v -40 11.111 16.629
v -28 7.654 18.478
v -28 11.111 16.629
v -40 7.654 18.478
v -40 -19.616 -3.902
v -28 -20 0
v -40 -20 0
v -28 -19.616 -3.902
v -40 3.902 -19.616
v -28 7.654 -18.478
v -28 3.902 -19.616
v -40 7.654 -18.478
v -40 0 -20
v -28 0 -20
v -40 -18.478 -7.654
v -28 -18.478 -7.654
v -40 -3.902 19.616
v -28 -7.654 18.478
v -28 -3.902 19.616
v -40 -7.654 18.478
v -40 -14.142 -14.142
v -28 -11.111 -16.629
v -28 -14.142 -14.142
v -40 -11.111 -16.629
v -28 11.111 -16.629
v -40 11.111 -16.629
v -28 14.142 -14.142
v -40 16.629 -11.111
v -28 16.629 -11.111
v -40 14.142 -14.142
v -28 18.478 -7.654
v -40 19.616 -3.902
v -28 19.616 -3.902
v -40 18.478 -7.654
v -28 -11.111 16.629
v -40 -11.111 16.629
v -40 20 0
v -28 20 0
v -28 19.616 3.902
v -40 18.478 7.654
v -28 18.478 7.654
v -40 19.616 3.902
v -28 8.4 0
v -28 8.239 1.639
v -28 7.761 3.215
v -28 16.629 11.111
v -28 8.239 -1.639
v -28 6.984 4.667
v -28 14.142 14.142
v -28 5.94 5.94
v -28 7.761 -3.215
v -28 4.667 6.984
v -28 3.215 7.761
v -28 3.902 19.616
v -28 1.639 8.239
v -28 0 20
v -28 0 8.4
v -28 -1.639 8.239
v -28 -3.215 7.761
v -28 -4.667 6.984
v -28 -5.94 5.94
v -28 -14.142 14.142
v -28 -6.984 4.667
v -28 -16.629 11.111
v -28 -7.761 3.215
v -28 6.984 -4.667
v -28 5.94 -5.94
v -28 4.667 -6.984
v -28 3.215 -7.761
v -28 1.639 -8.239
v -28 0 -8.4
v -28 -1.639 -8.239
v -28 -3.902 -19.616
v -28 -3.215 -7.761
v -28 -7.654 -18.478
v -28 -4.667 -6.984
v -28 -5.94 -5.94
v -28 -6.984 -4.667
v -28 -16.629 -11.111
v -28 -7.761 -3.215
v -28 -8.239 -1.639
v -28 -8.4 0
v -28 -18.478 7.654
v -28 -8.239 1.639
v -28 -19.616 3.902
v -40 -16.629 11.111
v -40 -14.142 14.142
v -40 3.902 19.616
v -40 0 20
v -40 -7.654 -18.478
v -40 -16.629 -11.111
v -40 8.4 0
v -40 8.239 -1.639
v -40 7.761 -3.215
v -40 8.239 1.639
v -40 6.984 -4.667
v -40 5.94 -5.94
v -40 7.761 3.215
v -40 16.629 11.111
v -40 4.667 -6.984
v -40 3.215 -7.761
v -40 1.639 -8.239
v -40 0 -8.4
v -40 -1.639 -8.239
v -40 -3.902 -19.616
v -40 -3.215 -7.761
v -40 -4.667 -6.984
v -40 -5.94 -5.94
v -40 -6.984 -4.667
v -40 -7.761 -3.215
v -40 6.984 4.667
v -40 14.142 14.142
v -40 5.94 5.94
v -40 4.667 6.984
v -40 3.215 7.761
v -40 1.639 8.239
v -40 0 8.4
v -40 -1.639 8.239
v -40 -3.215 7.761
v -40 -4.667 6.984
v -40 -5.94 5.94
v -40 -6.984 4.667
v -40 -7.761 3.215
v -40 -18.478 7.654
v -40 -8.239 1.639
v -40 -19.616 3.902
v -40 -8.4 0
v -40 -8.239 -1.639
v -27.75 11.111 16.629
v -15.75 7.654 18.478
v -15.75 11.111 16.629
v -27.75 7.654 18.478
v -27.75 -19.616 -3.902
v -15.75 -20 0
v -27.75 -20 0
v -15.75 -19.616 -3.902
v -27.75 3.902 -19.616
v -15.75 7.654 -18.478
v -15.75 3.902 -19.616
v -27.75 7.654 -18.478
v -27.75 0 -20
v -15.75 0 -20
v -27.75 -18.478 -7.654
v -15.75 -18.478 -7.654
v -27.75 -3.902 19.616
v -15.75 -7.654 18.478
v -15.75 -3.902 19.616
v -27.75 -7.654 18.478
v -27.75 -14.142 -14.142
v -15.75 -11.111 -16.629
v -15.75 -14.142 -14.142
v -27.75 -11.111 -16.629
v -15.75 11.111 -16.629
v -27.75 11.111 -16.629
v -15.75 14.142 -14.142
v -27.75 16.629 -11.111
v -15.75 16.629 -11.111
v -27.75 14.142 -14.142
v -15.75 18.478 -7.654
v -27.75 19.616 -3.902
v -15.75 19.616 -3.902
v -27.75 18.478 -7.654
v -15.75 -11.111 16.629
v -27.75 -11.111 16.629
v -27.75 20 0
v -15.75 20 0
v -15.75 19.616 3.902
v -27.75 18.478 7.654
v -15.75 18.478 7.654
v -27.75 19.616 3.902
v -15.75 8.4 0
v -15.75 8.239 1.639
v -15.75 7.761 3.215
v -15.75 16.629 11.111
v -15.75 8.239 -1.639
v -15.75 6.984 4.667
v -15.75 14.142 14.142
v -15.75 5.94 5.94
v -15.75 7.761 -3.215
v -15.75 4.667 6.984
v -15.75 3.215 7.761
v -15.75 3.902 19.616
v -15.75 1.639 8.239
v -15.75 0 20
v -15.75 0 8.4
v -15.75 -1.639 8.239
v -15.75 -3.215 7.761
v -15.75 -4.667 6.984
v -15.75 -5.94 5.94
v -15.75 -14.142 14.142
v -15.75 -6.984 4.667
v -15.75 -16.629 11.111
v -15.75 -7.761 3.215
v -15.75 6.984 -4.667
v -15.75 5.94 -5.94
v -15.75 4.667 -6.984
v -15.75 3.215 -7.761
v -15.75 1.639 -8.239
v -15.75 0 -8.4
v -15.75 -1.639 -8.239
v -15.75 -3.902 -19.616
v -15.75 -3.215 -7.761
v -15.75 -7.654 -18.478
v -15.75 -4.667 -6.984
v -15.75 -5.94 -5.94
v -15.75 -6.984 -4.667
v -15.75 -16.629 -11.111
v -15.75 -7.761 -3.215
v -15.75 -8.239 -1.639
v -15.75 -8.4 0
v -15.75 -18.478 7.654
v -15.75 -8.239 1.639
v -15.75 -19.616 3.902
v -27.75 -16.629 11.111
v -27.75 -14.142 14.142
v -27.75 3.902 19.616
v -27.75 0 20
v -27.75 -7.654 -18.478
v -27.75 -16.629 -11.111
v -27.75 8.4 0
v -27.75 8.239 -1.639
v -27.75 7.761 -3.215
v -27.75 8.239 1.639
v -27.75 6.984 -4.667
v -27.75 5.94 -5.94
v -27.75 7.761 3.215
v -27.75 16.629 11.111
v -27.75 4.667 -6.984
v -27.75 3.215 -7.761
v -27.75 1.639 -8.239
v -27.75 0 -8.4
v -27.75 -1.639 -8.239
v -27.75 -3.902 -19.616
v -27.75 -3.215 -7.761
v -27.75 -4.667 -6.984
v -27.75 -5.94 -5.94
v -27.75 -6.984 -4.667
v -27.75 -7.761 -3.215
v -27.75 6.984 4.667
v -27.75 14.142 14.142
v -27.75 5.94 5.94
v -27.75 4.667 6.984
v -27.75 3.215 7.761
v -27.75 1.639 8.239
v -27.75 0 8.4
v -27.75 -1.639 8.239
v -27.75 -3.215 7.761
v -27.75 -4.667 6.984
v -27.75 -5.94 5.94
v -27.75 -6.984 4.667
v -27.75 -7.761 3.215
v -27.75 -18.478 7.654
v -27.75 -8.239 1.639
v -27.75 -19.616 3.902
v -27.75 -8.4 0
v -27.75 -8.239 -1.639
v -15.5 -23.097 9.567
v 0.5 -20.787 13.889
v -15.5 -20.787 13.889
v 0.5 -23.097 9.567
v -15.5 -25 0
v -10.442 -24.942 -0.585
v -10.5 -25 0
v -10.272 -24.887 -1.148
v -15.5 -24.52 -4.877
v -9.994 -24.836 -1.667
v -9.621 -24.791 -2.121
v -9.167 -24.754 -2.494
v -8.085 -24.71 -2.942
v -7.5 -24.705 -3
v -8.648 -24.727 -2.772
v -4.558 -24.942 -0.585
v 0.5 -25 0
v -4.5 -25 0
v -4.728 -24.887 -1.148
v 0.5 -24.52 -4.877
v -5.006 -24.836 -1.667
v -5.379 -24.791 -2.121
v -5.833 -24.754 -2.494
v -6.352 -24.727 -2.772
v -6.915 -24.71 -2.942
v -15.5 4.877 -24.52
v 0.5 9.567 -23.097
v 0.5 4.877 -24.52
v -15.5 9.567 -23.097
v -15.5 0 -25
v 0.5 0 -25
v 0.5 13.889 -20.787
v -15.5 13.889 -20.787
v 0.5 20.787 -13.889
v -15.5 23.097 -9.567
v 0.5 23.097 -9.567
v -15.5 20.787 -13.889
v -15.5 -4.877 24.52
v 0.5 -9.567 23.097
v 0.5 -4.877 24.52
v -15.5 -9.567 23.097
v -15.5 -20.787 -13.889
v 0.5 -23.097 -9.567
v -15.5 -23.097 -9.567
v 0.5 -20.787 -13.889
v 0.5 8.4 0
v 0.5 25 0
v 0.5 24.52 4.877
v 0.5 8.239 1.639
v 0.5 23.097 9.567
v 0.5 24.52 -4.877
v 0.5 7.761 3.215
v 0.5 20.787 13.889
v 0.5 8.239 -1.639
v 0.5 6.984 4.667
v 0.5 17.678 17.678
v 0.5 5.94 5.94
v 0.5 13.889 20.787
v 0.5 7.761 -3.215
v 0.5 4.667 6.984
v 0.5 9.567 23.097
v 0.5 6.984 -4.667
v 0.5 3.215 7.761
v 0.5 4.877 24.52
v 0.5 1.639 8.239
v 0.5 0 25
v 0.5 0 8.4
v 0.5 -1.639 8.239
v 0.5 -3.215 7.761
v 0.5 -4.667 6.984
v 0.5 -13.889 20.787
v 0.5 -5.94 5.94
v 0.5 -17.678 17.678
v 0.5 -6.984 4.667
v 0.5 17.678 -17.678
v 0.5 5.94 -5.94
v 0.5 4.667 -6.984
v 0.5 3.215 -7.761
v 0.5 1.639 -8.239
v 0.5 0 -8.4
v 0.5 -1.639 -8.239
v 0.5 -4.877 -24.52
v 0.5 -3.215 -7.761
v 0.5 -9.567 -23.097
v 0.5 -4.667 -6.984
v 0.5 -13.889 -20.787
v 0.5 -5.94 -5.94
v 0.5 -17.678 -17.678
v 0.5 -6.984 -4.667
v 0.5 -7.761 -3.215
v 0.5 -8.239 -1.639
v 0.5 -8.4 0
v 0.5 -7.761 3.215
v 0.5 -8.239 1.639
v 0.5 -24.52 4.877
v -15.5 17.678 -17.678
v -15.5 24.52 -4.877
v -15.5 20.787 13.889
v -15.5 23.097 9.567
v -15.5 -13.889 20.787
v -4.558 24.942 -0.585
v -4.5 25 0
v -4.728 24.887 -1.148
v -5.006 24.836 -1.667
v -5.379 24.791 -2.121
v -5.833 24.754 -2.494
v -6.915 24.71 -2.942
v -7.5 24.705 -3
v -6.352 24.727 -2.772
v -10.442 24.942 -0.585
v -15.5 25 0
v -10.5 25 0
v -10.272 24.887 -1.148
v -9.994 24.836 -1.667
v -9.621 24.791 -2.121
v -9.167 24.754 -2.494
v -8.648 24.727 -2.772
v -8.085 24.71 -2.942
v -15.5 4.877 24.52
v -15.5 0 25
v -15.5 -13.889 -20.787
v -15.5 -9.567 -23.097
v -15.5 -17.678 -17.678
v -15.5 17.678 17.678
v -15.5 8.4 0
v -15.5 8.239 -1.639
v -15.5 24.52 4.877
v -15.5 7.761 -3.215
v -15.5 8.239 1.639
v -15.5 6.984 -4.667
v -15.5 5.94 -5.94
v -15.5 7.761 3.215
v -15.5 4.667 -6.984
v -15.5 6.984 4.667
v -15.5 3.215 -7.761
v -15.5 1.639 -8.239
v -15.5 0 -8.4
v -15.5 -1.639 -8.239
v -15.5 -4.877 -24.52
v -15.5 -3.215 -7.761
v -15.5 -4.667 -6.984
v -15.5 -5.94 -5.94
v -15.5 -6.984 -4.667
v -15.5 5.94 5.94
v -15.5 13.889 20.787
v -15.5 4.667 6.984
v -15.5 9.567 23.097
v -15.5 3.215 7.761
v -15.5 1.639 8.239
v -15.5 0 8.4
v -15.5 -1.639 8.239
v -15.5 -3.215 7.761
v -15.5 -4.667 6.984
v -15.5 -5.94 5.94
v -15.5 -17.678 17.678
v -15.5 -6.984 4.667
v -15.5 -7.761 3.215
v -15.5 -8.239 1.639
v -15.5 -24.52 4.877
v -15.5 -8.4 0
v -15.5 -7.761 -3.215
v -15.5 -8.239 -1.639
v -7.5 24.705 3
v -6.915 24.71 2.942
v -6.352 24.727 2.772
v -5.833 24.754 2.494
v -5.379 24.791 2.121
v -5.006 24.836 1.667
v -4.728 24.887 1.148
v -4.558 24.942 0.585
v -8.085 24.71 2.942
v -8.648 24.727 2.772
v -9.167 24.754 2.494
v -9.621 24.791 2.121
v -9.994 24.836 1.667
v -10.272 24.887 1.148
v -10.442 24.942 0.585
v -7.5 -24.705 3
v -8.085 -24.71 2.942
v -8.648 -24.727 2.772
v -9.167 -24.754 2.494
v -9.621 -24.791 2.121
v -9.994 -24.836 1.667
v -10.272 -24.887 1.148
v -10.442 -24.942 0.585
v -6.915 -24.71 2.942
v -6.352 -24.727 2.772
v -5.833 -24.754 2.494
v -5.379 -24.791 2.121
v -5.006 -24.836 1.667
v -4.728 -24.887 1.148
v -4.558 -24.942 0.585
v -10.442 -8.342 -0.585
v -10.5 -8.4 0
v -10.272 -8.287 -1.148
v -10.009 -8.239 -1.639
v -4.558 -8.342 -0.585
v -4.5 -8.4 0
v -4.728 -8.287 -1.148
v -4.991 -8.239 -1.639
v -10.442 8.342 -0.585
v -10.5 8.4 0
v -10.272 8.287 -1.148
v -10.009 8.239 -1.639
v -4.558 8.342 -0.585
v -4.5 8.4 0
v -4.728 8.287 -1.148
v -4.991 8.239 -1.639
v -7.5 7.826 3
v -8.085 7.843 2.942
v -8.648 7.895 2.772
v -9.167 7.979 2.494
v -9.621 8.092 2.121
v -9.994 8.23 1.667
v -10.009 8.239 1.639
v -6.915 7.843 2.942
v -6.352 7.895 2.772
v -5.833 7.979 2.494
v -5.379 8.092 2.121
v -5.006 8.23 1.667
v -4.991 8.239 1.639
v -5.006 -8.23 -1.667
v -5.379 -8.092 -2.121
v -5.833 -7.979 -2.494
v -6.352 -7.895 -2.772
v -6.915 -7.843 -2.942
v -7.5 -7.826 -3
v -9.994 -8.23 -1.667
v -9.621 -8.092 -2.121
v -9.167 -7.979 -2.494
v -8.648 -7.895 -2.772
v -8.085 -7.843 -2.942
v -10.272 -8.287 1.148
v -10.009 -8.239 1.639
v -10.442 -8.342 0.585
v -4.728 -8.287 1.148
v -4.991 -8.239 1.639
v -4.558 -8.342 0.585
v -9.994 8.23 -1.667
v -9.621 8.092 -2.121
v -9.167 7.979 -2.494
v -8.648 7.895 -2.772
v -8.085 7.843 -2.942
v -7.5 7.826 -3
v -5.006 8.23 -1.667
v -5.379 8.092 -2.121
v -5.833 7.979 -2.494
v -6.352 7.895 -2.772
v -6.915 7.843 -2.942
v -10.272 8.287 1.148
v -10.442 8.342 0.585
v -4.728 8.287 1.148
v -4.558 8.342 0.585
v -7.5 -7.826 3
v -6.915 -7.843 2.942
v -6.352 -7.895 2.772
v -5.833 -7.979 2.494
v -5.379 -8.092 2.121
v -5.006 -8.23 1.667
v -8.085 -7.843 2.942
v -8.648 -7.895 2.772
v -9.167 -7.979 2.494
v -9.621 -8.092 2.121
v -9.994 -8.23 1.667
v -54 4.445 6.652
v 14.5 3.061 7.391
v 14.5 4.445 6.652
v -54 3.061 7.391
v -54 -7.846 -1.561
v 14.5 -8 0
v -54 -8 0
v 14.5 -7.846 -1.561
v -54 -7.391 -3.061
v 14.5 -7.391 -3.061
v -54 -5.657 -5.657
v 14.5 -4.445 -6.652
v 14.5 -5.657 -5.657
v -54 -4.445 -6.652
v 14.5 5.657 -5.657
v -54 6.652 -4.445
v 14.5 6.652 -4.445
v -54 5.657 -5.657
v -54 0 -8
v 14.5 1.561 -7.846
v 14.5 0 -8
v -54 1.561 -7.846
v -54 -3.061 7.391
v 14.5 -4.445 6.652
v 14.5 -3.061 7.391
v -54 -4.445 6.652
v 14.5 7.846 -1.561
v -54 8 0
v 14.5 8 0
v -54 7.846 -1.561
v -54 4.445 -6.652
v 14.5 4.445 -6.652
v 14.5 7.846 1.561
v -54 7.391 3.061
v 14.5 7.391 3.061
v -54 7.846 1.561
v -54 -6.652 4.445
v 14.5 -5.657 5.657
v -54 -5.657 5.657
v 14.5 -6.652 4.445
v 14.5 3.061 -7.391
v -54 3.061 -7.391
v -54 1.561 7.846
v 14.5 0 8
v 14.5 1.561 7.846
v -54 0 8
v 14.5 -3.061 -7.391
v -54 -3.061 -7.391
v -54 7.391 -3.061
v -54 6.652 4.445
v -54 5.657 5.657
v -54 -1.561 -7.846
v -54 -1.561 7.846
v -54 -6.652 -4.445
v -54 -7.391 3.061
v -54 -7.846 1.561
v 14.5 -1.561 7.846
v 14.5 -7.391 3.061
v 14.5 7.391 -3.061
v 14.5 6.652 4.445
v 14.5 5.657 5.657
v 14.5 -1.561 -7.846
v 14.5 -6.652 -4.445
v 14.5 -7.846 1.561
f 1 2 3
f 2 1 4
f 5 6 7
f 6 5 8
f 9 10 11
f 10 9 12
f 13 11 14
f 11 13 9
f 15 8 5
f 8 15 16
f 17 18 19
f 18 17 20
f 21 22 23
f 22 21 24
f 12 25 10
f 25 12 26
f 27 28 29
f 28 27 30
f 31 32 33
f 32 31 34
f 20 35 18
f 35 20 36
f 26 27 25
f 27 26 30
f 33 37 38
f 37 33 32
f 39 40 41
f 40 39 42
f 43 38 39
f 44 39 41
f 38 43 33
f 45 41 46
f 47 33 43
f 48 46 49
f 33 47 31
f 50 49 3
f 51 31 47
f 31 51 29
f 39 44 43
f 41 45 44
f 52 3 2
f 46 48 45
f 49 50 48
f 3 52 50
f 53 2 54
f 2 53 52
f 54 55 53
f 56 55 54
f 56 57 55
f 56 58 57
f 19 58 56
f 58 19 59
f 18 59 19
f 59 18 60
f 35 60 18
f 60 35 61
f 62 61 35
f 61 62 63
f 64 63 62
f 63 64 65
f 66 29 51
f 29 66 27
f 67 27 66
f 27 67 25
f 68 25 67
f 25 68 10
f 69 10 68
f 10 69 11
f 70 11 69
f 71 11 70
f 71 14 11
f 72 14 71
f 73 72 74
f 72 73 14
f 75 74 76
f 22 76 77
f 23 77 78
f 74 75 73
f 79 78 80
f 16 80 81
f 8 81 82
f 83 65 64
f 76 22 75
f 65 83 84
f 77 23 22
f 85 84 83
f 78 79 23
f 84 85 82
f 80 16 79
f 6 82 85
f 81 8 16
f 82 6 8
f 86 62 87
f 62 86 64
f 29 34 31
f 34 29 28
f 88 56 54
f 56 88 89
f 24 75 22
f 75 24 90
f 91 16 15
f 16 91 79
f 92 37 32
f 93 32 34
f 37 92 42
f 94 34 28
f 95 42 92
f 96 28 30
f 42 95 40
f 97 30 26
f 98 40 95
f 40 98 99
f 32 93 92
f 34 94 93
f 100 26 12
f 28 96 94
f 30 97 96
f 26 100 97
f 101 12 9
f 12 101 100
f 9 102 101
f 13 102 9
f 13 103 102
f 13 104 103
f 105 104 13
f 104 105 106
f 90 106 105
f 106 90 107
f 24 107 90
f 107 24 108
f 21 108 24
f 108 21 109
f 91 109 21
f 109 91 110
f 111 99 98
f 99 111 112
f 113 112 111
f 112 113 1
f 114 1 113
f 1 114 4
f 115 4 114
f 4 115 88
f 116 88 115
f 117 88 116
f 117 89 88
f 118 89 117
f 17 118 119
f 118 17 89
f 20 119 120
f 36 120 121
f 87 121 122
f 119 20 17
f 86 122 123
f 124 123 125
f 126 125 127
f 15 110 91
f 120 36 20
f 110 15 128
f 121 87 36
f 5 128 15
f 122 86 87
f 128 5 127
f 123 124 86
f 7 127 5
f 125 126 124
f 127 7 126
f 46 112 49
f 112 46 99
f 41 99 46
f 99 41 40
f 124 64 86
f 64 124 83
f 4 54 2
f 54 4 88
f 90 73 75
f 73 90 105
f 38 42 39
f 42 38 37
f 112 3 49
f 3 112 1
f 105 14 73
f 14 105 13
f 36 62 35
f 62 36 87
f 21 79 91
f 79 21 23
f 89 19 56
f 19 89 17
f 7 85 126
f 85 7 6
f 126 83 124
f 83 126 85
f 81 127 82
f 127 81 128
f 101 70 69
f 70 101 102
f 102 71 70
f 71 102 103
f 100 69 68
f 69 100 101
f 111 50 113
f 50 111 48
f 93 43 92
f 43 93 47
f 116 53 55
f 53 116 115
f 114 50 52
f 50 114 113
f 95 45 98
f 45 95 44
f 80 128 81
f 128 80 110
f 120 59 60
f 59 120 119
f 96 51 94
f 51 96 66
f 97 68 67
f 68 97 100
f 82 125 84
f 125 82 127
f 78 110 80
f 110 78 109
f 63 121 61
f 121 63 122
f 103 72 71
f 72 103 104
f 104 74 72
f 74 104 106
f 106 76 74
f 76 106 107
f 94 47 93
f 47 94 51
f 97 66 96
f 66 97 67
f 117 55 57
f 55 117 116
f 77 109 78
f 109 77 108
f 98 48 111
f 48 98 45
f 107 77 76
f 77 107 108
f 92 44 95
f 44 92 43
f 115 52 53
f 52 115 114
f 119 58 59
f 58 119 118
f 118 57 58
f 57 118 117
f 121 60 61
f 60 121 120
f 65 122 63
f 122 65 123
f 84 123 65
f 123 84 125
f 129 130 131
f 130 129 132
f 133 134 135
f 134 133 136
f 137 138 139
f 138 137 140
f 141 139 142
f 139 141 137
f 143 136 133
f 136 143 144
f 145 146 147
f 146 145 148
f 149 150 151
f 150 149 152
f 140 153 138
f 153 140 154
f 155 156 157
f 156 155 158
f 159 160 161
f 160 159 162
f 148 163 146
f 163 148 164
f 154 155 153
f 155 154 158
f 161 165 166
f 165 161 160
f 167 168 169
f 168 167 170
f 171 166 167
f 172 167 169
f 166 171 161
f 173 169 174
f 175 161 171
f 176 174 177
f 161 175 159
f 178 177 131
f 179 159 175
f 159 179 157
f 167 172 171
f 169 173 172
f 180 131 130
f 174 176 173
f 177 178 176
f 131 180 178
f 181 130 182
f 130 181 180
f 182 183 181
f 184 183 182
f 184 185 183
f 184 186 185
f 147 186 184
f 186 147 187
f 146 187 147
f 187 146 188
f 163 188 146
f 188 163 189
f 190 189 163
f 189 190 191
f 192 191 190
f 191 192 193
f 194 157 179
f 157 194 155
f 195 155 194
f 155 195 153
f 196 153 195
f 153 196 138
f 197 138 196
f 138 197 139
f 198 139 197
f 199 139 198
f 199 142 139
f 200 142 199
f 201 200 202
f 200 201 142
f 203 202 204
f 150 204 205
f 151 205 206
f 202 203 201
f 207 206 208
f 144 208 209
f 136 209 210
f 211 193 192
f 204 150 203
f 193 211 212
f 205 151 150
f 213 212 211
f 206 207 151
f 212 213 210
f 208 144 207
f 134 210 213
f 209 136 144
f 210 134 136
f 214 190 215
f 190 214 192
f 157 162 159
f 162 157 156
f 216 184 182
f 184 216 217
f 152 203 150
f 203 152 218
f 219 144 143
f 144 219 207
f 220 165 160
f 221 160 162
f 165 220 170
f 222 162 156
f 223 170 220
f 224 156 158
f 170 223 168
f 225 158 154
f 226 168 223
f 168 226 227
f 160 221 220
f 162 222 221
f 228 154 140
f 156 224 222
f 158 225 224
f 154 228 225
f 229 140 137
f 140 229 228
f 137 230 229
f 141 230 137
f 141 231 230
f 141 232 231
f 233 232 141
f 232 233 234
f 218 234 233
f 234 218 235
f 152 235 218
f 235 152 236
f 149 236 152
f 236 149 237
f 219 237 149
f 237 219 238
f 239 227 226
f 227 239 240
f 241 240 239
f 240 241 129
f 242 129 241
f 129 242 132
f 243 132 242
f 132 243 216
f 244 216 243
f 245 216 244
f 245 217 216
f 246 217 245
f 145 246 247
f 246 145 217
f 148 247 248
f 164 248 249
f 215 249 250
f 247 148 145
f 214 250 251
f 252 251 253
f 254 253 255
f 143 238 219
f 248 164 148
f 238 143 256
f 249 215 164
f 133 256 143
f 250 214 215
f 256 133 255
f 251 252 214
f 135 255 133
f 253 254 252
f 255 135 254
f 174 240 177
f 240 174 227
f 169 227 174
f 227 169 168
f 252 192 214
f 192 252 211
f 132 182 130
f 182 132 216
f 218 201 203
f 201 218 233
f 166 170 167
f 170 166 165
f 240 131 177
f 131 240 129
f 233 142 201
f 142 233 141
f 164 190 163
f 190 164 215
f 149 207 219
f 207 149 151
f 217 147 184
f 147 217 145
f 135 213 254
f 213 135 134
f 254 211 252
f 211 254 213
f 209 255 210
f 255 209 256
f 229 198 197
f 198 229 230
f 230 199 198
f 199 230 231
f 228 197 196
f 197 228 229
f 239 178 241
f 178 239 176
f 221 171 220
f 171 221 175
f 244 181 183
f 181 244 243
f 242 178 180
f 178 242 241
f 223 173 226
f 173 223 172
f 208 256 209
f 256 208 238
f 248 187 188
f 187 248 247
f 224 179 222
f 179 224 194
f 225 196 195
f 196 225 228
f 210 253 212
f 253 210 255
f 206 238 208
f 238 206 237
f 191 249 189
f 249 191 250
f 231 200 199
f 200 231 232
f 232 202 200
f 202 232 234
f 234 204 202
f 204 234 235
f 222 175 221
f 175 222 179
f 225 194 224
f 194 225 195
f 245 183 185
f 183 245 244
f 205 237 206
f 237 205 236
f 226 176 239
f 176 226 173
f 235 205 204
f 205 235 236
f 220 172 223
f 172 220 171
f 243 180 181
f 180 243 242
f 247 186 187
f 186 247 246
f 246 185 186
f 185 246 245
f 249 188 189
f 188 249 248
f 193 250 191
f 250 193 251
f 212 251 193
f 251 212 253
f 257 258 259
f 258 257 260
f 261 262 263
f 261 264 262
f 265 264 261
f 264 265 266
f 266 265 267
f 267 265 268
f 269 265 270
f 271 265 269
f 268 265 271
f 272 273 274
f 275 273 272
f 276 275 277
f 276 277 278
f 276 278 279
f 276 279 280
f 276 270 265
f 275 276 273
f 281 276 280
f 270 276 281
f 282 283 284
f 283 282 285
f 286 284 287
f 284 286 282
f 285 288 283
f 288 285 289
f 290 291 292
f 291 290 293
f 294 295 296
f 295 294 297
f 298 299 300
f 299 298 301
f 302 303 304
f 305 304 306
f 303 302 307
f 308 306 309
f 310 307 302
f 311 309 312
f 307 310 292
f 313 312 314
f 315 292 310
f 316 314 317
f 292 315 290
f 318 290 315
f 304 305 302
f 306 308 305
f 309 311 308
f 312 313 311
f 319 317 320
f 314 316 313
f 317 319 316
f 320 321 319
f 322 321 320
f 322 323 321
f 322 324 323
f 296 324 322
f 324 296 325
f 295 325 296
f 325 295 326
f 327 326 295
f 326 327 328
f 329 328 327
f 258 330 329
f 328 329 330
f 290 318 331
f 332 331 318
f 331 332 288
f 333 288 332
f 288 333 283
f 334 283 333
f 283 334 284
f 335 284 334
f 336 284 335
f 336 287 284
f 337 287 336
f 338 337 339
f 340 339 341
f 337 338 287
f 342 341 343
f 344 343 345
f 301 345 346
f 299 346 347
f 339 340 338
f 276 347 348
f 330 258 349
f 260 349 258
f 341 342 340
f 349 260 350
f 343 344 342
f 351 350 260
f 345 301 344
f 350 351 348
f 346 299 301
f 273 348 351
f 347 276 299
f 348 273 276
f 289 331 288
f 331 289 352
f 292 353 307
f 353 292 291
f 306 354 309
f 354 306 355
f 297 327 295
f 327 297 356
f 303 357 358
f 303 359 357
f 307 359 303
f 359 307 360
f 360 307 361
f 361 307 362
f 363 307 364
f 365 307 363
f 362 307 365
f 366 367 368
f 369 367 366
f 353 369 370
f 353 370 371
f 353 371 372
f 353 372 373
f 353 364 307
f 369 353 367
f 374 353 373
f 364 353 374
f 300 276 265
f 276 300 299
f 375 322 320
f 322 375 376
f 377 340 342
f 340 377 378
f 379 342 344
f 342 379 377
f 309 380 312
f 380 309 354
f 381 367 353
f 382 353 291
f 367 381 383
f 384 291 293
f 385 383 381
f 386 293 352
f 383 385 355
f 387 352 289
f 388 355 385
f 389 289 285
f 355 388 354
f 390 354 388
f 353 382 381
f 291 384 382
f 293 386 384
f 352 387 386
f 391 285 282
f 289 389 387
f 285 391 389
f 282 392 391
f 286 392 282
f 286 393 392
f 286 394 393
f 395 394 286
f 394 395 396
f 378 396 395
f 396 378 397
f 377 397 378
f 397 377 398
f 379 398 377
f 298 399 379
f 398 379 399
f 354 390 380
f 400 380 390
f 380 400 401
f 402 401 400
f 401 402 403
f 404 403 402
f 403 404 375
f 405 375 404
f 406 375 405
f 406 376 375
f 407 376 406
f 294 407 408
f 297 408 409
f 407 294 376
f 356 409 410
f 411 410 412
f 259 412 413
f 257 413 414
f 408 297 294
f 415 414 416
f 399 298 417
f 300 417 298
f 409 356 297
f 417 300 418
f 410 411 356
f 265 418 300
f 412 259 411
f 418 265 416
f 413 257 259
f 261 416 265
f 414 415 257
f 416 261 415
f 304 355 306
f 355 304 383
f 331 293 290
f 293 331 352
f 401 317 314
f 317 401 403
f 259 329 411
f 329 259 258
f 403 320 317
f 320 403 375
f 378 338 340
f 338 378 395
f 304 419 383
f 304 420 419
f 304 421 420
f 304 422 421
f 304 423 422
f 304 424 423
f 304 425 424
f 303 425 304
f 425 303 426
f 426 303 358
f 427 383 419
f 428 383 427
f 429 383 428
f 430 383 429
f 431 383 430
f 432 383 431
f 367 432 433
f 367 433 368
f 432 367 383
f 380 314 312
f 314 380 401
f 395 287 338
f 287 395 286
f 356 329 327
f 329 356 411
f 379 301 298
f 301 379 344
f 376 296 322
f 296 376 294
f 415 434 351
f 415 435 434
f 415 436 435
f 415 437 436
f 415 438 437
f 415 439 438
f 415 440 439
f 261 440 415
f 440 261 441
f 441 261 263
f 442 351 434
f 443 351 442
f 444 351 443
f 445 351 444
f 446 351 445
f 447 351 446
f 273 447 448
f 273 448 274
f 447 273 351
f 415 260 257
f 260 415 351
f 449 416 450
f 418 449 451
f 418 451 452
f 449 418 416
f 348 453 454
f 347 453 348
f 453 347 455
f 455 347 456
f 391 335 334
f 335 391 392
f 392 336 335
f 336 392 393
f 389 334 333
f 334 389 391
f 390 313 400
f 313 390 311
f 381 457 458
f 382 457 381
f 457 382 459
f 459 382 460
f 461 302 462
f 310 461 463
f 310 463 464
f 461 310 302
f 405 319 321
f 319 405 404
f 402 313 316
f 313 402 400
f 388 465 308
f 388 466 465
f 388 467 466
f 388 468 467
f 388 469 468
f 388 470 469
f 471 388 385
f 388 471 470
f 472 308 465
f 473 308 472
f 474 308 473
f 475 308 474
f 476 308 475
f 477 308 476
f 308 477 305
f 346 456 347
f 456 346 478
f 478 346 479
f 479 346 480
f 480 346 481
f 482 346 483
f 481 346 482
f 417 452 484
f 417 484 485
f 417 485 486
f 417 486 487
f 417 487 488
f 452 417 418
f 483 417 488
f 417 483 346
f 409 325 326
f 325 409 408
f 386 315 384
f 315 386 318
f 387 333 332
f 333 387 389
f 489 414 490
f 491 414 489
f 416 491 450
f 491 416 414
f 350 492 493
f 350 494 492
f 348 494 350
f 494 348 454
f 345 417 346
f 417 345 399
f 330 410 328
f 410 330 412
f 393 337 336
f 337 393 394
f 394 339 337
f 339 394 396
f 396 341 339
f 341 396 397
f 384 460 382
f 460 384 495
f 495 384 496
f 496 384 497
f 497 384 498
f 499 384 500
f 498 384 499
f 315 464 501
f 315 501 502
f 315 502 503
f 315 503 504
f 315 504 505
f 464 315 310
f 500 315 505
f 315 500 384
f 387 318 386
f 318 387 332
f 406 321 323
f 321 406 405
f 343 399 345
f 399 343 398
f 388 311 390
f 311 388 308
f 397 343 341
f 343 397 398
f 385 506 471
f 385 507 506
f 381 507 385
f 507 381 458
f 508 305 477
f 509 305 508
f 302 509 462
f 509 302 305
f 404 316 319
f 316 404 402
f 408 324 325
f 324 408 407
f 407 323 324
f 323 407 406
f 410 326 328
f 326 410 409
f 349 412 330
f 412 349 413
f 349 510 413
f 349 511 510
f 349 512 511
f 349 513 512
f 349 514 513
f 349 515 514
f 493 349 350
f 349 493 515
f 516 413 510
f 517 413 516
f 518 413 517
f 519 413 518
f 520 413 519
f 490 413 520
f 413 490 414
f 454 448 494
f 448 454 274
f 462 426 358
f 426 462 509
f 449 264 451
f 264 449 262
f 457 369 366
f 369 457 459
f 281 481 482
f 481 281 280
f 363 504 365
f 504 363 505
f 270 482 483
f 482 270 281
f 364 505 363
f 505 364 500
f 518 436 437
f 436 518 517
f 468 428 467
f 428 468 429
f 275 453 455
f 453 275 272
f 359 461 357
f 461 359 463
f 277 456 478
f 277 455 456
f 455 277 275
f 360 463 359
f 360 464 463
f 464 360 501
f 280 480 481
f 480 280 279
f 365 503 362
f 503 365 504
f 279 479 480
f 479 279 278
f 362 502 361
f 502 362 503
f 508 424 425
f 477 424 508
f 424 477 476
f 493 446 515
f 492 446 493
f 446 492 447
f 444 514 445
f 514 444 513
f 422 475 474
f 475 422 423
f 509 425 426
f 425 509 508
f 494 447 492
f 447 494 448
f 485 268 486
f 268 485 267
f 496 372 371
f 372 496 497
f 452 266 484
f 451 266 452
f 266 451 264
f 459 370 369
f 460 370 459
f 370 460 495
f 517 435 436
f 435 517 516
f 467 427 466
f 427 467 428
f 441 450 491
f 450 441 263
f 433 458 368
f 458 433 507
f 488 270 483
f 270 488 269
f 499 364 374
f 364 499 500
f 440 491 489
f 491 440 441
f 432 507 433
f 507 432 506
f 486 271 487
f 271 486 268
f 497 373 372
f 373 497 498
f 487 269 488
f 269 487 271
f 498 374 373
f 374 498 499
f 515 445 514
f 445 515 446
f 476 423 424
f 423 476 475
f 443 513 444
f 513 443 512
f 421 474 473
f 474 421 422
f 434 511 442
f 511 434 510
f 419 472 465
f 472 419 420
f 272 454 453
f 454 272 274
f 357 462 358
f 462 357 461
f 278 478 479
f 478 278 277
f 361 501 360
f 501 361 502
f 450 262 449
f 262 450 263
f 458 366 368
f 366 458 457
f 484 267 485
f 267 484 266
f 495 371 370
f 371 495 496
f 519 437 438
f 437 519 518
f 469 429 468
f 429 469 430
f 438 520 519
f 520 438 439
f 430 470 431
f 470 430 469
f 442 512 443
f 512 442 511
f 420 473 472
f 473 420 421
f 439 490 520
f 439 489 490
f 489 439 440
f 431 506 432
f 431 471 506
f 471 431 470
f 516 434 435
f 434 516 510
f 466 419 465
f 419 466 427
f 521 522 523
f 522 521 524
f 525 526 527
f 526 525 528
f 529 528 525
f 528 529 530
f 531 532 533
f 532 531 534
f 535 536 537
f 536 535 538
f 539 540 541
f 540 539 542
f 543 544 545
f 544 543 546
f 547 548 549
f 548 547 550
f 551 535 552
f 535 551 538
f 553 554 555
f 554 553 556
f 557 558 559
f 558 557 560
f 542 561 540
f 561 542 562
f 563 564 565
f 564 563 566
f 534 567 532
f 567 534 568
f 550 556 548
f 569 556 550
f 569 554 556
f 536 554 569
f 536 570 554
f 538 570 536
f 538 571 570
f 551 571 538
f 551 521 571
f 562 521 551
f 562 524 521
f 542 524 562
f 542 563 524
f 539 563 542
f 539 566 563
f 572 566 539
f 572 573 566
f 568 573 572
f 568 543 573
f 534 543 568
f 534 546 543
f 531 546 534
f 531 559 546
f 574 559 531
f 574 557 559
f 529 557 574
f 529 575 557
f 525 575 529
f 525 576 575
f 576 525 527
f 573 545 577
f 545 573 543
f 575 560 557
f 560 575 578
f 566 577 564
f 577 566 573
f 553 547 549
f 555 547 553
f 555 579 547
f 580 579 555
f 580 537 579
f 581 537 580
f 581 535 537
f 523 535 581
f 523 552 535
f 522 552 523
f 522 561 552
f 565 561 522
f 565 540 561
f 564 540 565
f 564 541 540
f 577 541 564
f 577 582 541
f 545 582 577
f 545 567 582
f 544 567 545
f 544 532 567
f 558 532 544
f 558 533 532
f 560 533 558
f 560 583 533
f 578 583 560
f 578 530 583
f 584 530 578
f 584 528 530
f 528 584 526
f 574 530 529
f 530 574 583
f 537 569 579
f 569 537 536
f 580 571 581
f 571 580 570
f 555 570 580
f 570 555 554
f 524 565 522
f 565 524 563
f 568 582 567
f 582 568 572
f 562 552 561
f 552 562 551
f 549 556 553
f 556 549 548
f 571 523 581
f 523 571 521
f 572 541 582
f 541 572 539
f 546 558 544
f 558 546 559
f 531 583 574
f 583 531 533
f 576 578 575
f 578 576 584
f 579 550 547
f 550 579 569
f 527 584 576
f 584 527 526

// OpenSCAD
$fn = 32;

// ------------------------------------------------------------------------
// Shaft with rings and collars: d16 shaft, 3 rings
// Every part is its own module, assembly() places them once.
// ------------------------------------------------------------------------

// --- part 1 ---
module shaft() {
  translate([0, 0, -34.25]) cylinder(h = 68.5, d = 16);
}

// --- part 2 ---
module spacer_a() {
  difference() {
      translate([0, 0, 0]) cylinder(h = 12, d = 40);
      translate([0, 0, -1]) cylinder(h = 14, d = 16.8);
    }
}

// --- part 3 ---
module spacer_b() {
  difference() {
      translate([0, 0, 0]) cylinder(h = 12, d = 40);
      translate([0, 0, -1]) cylinder(h = 14, d = 16.8);
    }
}

// --- part 4 ---
module collar_a() {
  difference() {
    cylinder(h = 16, d = 50);
    translate([0, 0, -1]) cylinder(h = 18, d = 16.8);
    translate([0, 0, 8]) rotate([90, 0, 0]) cylinder(h = 52, d = 6, center = true);
  }
}

// --- assembly ---
module assembly() {
  translate([-19.75, 0, 0]) rotate([0, 90, 0]) shaft();
  translate([-40, 0, 0]) rotate([0, 90, 0]) spacer_a();
  translate([-27.75, 0, 0]) rotate([0, 90, 0]) spacer_b();
  translate([-15.5, 0, 0]) rotate([0, 90, 0]) collar_a();
}

assembly();
